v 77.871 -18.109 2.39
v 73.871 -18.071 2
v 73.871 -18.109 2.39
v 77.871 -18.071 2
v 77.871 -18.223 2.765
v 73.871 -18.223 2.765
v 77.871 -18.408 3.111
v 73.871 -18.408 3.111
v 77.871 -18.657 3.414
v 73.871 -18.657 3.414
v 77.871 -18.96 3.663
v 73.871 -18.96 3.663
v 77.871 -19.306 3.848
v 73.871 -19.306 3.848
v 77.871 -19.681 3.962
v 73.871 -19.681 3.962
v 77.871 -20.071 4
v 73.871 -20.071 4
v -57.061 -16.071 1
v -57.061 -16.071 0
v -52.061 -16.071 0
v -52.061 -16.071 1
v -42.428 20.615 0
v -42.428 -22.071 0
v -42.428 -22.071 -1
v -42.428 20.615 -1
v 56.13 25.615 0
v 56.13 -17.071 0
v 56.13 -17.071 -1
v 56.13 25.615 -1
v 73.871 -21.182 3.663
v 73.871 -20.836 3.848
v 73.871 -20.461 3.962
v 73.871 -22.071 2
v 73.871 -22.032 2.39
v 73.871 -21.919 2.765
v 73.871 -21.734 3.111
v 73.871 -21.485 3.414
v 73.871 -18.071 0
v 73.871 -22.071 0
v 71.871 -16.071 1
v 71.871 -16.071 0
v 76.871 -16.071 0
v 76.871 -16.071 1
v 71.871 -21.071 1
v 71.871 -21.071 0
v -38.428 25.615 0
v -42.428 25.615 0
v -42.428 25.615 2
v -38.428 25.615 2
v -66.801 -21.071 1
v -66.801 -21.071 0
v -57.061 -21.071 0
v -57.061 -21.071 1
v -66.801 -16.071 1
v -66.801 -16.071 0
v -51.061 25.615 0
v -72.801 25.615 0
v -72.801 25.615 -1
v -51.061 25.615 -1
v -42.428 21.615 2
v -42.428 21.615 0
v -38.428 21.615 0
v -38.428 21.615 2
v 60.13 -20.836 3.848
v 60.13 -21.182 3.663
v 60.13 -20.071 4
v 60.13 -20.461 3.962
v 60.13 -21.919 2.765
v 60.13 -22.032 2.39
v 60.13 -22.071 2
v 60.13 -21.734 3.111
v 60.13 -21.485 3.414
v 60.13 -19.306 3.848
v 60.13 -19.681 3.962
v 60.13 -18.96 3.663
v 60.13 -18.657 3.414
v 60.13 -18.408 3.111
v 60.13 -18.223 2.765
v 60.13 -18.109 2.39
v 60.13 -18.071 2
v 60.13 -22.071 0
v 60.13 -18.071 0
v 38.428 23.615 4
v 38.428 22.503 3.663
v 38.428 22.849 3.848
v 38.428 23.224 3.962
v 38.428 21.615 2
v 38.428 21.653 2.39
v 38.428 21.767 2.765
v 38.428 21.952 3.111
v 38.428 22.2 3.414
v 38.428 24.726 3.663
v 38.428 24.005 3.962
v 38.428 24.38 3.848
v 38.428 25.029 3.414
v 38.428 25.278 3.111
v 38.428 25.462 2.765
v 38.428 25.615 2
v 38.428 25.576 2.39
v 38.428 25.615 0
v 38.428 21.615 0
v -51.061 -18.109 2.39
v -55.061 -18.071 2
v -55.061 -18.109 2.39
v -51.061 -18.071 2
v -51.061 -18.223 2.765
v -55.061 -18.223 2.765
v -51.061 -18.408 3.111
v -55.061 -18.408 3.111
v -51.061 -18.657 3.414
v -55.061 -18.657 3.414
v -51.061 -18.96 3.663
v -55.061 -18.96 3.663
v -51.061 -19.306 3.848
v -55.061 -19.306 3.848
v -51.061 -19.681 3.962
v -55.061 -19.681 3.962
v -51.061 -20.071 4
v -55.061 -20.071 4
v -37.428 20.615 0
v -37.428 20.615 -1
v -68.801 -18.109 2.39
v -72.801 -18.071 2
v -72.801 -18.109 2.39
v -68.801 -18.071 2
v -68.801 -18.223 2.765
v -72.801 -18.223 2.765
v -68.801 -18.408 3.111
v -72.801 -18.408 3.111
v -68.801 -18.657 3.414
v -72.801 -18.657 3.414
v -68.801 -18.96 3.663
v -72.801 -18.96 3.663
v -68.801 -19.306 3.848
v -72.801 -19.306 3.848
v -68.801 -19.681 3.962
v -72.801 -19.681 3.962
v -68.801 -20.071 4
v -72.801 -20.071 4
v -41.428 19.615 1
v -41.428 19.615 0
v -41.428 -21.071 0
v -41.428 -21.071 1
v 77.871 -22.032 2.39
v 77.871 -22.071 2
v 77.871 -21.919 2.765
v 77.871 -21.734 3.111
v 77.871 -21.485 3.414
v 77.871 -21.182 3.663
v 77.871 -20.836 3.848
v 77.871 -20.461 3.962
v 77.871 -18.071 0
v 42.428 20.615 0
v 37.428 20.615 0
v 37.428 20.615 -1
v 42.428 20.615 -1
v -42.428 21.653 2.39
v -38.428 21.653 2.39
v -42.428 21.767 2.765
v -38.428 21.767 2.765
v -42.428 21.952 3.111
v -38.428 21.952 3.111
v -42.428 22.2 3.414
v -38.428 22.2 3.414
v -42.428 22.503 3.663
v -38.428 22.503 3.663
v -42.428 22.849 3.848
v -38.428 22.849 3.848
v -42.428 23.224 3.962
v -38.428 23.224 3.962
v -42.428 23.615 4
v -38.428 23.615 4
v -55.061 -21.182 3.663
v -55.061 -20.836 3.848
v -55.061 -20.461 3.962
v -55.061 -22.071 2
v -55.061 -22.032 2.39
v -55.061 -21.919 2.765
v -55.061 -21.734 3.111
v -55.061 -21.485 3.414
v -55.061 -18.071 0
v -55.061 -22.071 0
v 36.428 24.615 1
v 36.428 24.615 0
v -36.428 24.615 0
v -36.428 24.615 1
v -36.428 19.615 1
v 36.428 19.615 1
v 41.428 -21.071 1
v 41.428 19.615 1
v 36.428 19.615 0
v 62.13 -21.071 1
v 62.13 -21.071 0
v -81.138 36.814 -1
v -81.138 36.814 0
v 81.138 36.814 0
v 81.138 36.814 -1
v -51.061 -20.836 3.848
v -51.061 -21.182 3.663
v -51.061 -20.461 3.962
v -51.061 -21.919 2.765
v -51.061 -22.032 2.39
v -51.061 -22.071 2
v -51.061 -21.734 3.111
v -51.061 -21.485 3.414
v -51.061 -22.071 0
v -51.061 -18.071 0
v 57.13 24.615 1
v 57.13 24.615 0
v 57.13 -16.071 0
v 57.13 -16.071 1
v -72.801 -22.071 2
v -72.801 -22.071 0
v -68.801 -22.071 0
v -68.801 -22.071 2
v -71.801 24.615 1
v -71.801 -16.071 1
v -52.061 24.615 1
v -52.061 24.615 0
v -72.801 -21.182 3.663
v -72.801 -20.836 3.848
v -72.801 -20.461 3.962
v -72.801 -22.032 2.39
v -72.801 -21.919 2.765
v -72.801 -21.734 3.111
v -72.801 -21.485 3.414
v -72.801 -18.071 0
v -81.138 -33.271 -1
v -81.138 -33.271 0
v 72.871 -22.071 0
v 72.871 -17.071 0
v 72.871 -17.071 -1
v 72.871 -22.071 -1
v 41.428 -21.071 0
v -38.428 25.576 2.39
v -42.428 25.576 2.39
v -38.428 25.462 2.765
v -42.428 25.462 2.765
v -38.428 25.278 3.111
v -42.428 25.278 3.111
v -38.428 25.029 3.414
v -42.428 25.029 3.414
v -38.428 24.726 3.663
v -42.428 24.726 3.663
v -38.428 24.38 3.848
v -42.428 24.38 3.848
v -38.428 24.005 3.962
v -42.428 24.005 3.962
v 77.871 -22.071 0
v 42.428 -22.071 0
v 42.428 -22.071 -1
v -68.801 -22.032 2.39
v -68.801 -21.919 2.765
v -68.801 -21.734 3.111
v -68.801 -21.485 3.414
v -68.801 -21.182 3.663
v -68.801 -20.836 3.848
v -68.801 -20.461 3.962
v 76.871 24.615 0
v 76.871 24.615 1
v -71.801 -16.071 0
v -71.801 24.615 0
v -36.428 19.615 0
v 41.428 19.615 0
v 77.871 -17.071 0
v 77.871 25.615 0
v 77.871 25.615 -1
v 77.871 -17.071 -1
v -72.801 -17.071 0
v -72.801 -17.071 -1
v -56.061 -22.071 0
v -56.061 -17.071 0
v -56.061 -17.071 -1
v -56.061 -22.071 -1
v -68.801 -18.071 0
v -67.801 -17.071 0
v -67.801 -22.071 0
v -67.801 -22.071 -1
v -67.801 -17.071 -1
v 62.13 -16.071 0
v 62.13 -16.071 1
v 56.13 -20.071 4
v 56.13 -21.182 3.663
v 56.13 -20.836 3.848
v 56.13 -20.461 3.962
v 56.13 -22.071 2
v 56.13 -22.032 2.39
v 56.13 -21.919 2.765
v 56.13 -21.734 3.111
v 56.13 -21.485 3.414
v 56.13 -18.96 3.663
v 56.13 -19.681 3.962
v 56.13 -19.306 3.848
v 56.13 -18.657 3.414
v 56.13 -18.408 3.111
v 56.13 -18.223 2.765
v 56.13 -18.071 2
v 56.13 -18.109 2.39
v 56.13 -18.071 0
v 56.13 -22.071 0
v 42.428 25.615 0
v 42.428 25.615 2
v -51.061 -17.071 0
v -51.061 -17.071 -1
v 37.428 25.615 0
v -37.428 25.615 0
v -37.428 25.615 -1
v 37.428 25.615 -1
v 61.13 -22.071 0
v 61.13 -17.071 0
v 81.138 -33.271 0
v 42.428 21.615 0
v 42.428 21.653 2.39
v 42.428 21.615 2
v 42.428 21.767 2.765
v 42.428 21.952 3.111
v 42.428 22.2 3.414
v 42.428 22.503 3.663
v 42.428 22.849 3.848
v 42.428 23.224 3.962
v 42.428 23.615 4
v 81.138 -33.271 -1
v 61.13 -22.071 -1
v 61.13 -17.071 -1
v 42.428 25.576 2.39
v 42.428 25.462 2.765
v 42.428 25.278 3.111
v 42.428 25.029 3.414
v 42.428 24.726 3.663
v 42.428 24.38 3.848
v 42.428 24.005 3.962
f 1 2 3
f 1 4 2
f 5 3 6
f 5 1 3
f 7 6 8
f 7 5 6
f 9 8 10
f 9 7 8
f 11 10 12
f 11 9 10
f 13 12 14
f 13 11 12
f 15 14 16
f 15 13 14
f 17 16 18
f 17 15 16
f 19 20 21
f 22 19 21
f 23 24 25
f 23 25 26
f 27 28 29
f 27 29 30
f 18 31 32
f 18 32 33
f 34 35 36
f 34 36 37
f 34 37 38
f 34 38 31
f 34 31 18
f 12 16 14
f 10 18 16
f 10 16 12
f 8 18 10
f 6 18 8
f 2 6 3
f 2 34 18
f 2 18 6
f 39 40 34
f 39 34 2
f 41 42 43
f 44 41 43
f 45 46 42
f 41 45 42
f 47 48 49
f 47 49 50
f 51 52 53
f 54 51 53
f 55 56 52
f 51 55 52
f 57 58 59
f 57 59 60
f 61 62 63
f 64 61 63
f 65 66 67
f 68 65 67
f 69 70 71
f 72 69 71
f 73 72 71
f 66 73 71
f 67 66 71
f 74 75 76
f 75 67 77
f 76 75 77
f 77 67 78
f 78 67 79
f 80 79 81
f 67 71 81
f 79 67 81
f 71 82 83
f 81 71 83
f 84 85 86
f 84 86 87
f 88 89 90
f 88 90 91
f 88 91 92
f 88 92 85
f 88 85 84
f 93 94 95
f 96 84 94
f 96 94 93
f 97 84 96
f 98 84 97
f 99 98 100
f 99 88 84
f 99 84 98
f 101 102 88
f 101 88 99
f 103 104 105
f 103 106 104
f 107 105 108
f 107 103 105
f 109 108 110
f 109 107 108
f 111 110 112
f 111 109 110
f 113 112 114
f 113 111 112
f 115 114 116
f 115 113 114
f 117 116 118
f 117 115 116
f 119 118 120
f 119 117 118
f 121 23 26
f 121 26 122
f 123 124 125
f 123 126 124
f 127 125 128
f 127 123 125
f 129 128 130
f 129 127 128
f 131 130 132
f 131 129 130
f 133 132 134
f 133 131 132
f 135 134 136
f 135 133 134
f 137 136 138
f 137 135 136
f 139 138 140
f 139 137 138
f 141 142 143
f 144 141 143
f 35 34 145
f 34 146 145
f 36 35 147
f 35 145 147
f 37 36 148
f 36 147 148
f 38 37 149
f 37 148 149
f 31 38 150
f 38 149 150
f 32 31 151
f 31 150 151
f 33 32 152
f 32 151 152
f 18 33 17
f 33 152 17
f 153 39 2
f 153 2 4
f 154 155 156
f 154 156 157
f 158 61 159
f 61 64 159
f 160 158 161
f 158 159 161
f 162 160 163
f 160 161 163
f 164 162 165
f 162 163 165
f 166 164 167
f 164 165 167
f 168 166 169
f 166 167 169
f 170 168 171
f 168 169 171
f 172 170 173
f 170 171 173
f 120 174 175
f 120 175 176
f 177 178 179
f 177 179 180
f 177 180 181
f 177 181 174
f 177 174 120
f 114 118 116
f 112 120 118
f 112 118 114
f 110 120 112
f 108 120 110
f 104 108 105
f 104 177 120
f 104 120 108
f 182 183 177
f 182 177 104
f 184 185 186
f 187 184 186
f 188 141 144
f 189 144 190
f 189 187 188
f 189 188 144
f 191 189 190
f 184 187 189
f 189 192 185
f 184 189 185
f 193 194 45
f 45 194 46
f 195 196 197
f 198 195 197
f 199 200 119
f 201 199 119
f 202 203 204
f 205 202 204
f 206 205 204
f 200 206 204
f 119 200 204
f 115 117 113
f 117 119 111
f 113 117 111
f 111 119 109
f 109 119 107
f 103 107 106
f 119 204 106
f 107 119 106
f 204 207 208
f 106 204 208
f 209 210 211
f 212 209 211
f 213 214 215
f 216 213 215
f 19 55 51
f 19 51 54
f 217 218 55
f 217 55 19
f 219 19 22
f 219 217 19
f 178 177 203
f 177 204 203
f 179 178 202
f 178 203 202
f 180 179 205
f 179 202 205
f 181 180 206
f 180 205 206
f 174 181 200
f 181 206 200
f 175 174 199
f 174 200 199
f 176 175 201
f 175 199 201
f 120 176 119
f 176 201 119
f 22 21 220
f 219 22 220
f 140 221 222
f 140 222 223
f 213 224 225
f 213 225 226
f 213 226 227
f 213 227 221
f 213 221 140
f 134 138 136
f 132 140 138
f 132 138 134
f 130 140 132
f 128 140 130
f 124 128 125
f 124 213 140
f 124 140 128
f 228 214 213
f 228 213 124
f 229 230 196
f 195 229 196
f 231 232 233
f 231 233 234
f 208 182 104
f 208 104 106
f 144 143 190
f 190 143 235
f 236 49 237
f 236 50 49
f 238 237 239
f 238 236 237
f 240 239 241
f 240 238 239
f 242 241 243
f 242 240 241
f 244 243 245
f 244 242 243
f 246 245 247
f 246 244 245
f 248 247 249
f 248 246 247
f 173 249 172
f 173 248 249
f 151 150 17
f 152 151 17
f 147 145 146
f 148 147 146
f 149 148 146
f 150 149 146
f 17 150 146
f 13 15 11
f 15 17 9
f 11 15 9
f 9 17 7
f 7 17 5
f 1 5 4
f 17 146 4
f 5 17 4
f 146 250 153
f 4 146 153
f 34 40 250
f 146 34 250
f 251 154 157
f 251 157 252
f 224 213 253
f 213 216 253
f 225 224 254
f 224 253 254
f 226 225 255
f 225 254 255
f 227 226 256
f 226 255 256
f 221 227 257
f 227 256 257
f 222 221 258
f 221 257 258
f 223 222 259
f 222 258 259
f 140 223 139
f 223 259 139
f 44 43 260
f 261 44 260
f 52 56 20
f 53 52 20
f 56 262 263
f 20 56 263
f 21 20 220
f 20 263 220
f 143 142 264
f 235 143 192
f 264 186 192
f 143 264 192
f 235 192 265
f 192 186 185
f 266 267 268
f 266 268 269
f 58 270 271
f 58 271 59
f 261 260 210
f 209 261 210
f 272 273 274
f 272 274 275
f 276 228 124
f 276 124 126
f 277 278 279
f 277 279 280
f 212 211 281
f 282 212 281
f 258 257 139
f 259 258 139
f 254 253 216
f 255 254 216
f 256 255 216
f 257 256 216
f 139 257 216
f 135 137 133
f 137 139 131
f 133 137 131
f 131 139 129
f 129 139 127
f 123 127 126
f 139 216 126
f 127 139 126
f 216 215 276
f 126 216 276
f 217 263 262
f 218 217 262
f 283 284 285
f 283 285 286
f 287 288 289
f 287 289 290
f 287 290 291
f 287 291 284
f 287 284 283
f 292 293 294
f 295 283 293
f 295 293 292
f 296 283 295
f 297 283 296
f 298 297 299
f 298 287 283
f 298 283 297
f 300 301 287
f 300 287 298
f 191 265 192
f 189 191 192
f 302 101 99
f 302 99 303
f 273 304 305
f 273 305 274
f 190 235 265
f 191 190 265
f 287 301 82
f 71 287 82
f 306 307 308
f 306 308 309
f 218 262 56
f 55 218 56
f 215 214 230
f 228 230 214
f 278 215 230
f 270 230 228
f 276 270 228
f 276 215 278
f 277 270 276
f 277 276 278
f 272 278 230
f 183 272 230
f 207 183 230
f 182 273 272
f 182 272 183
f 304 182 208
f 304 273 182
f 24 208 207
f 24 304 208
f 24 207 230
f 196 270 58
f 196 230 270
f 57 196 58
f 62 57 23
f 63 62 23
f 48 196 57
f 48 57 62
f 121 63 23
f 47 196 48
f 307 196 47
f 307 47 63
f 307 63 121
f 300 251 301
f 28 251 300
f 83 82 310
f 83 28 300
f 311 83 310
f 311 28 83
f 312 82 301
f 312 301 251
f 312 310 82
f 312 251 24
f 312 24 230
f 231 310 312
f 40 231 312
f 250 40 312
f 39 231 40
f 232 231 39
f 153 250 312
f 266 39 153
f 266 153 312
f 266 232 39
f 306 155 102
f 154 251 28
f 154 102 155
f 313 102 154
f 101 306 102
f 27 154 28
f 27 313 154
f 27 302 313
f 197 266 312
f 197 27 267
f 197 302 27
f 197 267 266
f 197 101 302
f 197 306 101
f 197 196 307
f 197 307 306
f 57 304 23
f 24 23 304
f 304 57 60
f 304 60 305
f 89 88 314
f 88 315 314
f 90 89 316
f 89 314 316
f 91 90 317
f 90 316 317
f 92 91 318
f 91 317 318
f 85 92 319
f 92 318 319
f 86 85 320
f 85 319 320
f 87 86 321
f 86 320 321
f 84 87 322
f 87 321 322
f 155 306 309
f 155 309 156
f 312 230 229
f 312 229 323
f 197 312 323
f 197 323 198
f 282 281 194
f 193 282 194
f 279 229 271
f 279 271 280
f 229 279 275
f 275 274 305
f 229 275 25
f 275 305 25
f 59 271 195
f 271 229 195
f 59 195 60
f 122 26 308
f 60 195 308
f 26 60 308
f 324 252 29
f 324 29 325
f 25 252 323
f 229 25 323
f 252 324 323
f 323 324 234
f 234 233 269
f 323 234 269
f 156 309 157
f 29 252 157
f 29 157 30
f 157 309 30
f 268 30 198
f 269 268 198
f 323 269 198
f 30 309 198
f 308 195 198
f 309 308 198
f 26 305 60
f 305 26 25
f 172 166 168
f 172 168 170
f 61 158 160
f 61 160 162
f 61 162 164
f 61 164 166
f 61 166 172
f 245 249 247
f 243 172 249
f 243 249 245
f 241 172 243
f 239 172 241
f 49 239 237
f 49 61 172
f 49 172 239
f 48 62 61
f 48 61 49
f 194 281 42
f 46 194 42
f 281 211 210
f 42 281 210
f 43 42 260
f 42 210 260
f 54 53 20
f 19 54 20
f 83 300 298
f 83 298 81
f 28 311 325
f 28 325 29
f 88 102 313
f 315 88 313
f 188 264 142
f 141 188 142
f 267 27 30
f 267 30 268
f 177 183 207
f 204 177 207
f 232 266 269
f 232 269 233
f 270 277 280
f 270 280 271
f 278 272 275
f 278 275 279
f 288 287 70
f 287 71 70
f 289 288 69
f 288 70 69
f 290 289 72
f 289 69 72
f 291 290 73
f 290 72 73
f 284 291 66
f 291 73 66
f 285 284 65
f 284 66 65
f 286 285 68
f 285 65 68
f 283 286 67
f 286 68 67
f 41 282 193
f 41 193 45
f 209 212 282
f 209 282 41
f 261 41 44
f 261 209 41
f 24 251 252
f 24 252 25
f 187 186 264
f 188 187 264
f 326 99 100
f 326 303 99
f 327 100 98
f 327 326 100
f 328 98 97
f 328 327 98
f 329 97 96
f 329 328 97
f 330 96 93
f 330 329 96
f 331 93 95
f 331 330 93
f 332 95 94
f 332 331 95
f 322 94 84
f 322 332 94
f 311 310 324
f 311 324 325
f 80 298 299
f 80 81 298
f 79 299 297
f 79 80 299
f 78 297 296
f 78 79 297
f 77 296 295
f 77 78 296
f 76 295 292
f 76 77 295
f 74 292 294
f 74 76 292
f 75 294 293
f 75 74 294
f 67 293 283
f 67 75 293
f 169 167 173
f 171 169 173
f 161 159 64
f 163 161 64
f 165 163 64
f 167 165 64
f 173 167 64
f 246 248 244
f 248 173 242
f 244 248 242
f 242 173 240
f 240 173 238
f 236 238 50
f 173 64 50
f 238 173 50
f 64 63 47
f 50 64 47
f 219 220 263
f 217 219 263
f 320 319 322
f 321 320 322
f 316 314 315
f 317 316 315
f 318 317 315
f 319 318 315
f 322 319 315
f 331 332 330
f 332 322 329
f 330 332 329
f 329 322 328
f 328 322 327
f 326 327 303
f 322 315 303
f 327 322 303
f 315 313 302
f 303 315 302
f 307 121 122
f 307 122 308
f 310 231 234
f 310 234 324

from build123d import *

# Parameters (mm, degrees)
F0_W     = 162.2753325211
F0_H     = 70.084847109
F0_W_2   = 4
F0_H_2   = 4
F1_DEPTH = 1
F2_DEPTH = 4
F3_R     = 1.99999
F4_DEPTH = 1


# Not quite as in the source:
# - a fillet or chamfer is up to 0.001 mm smaller than in the source, because OpenCascade refuses the exact size


with BuildPart() as f1:
    # F0 (on Top) → F1 (new body)
    with BuildSketch(Plane.XY):
        with Locations((0, 1.7718460756)):
            Rectangle(F0_W, F0_H)
        with Locations((-70.8014665545, -20.0708878118)):
            Rectangle(F0_W_2, F0_H_2, mode=Mode.SUBTRACT)
        with Locations((-53.0607582087, -20.0708878118)):
            Rectangle(F0_W_2, F0_H_2, mode=Mode.SUBTRACT)
        Polygon((-72.8014665545, -17.0708878118), (-72.8014665545, 25.6145799629), (-51.0607582087, 25.6145799629), (-51.0607582087, -17.0708878118), (-56.0607582087, -17.0708878118), (-56.0607582087, -22.0708878118), (-67.8014665545, -22.0708878118), (-67.8014665545, -17.0708878118), align=None, mode=Mode.SUBTRACT)
        with Locations((58.1299888442, -20.0708878118)):
            Rectangle(F0_W_2, F0_H_2, mode=Mode.SUBTRACT)
        with Locations((75.87069719, -20.0708878118)):
            Rectangle(F0_W_2, F0_H_2, mode=Mode.SUBTRACT)
        with Locations((-40.4279221569, 23.6145799629)):
            Rectangle(F0_W_2, F0_H_2, mode=Mode.SUBTRACT)
        Polygon((-37.4279221569, 20.6145799629), (-37.4279221569, 25.6145799629), (37.4279221569, 25.6145799629), (37.4279221569, 20.6145799629), (42.4279221569, 20.6145799629), (42.4279221569, -22.0708878118), (-42.4279221569, -22.0708878118), (-42.4279221569, 20.6145799629), align=None, mode=Mode.SUBTRACT)
        with Locations((40.4279221569, 23.6145799629)):
            Rectangle(F0_W_2, F0_H_2, mode=Mode.SUBTRACT)
        Polygon((72.87069719, -17.0708878118), (72.87069719, -22.0708878118), (61.1299888442, -22.0708878118), (61.1299888442, -17.0708878118), (56.1299888442, -17.0708878118), (56.1299888442, 25.6145799629), (77.87069719, 25.6145799629), (77.87069719, -17.0708878118), align=None, mode=Mode.SUBTRACT)
        with Locations((-53.0607582087, -20.0708878118)):
            Rectangle(F0_W_2, F0_H_2)
        with Locations((-70.8014665545, -20.0708878118)):
            Rectangle(F0_W_2, F0_H_2)
        with Locations((40.4279221569, 23.6145799629)):
            Rectangle(F0_W_2, F0_H_2)
        with Locations((-40.4279221569, 23.6145799629)):
            Rectangle(F0_W_2, F0_H_2)
        with Locations((75.87069719, -20.0708878118)):
            Rectangle(F0_W_2, F0_H_2)
        with Locations((58.1299888442, -20.0708878118)):
            Rectangle(F0_W_2, F0_H_2)
    extrude(amount=-F1_DEPTH)

    # F0 (on Top) → F2 (join)
    with BuildSketch(Plane.XY):
        with Locations((-70.8014665545, -20.0708878118)):
            Rectangle(F0_W_2, F0_H_2)
        with Locations((-53.0607582087, -20.0708878118)):
            Rectangle(F0_W_2, F0_H_2)
        with Locations((-40.4279221569, 23.6145799629)):
            Rectangle(F0_W_2, F0_H_2)
        with Locations((40.4279221569, 23.6145799629)):
            Rectangle(F0_W_2, F0_H_2)
        with Locations((75.87069719, -20.0708878118)):
            Rectangle(F0_W_2, F0_H_2)
        with Locations((58.1299888442, -20.0708878118)):
            Rectangle(F0_W_2, F0_H_2)
    extrude(amount=F2_DEPTH)

    # F3 (radius 2 in the source; OpenCascade refuses exactly that, so slightly less here)
    f3_edges = [f1.edges().sort_by_distance(p)[0] for p in [
        (-70.801467, -18.070888, 4),
        (-70.801467, -22.070888, 4),
        (-53.060758, -18.070888, 4),
        (-53.060758, -22.070888, 4),
        (-40.427922, 25.61458, 4),
        (-40.427922, 21.61458, 4),
        (40.427922, 25.61458, 4),
        (40.427922, 21.61458, 4),
        (58.129989, -18.070888, 4),
        (58.129989, -22.070888, 4),
        (75.870697, -22.070888, 4),
        (75.870697, -18.070888, 4),
    ]]
    fillet(f3_edges, radius=F3_R)


with BuildPart() as f4:
    # F0 (on Top) → F4 (new body)
    with BuildSketch(Plane.XY):
        Polygon((-52.0607582087, -16.0708878118), (-52.0607582087, 24.6145799629), (-71.8014665545, 24.6145799629), (-71.8014665545, -16.0708878118), (-66.8014665545, -16.0708878118), (-66.8014665545, -21.0708878118), (-57.0607582087, -21.0708878118), (-57.0607582087, -16.0708878118), align=None)
    extrude(amount=F4_DEPTH)


with BuildPart() as f4b:
    # F0 (on Top) → F4, piece 2 (new body)
    with BuildSketch(Plane.XY):
        Polygon((-36.4279221569, 19.6145799629), (-41.4279221569, 19.6145799629), (-41.4279221569, -21.0708878118), (41.4279221569, -21.0708878118), (41.4279221569, 19.6145799629), (36.4279221569, 19.6145799629), (36.4279221569, 24.6145799629), (-36.4279221569, 24.6145799629), align=None)
    extrude(amount=F4_DEPTH)


with BuildPart() as f4c:
    # F0 (on Top) → F4, piece 3 (new body)
    with BuildSketch(Plane.XY):
        Polygon((76.87069719, -16.0708878118), (76.87069719, 24.6145799629), (57.1299888442, 24.6145799629), (57.1299888442, -16.0708878118), (62.1299888442, -16.0708878118), (62.1299888442, -21.0708878118), (71.87069719, -21.0708878118), (71.87069719, -16.0708878118), align=None)
    extrude(amount=F4_DEPTH)


solid = Compound([f1.part, f4.part, f4b.part, f4c.part])
